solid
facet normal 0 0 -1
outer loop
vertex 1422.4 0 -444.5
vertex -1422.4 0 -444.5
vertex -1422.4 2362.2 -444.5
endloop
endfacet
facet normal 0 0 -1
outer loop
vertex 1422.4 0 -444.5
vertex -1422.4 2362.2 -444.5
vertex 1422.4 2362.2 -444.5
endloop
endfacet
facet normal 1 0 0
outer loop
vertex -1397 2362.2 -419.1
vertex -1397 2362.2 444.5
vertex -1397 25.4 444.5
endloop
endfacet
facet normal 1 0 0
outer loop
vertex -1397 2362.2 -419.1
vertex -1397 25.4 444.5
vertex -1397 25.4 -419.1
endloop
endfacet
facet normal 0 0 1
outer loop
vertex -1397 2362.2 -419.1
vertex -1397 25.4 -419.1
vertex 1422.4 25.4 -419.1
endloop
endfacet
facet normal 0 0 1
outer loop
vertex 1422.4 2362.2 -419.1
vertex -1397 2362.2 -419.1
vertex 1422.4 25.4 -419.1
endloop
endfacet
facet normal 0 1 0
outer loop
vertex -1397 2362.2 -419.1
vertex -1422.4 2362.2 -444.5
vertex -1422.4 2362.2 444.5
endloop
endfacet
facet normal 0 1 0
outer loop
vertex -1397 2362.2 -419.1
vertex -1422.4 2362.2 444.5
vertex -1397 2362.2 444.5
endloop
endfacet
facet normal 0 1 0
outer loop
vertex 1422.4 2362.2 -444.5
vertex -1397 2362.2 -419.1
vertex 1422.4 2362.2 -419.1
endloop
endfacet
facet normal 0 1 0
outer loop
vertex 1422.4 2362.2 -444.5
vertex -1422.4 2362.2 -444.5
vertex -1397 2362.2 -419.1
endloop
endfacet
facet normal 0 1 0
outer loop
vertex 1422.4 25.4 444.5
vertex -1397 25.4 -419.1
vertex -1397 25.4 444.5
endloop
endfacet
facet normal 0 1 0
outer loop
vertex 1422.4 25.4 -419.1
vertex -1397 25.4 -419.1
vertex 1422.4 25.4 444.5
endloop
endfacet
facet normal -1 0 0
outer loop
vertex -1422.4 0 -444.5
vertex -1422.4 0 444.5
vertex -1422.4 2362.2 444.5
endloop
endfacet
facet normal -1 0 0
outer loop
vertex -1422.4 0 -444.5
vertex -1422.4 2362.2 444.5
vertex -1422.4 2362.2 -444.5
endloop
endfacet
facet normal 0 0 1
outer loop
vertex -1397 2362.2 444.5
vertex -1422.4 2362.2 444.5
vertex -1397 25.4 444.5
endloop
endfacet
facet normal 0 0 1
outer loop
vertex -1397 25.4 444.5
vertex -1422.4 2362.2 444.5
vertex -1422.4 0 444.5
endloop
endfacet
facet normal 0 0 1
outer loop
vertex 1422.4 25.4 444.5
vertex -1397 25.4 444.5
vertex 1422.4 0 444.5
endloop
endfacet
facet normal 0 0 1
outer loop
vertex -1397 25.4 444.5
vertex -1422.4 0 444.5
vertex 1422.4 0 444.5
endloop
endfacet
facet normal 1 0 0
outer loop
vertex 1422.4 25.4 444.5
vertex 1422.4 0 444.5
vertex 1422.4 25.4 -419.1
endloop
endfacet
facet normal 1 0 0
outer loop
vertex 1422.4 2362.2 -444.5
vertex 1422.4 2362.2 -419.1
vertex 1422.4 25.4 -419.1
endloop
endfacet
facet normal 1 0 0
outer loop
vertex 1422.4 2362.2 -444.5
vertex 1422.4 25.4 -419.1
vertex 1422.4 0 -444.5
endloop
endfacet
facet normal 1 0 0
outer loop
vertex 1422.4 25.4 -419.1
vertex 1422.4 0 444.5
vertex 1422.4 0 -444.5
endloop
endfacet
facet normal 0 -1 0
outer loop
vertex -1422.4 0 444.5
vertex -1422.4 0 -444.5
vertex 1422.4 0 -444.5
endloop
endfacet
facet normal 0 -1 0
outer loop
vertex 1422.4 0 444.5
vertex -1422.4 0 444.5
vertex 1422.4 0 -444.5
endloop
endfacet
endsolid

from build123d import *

# Parameters (mm, degrees)
SKETCH1_W           = 2844.8
SKETCH1_H           = 889
BOSS_EXTRUDE1_DEPTH = 2362.2
SHELL1_T            = -25.4


with BuildPart() as part:
    # Sketch1 → Boss-Extrude1 (new body)
    with BuildSketch(Plane(origin=(0, 0, 0), x_dir=(1, 0, 0), z_dir=(0, 1, 0))):
        Rectangle(SKETCH1_W, SKETCH1_H)
    extrude(amount=BOSS_EXTRUDE1_DEPTH)

    # Shell1
    shell1_openings = [part.faces().sort_by_distance(p)[0] for p in [
        (0, 2362.2, 0),
        (1422.4, 1181.1, 0),
        (0, 1181.1, 444.5),
    ]]
    offset(amount=SHELL1_T, openings=shell1_openings, kind=Kind.INTERSECTION)


solid = part.part
